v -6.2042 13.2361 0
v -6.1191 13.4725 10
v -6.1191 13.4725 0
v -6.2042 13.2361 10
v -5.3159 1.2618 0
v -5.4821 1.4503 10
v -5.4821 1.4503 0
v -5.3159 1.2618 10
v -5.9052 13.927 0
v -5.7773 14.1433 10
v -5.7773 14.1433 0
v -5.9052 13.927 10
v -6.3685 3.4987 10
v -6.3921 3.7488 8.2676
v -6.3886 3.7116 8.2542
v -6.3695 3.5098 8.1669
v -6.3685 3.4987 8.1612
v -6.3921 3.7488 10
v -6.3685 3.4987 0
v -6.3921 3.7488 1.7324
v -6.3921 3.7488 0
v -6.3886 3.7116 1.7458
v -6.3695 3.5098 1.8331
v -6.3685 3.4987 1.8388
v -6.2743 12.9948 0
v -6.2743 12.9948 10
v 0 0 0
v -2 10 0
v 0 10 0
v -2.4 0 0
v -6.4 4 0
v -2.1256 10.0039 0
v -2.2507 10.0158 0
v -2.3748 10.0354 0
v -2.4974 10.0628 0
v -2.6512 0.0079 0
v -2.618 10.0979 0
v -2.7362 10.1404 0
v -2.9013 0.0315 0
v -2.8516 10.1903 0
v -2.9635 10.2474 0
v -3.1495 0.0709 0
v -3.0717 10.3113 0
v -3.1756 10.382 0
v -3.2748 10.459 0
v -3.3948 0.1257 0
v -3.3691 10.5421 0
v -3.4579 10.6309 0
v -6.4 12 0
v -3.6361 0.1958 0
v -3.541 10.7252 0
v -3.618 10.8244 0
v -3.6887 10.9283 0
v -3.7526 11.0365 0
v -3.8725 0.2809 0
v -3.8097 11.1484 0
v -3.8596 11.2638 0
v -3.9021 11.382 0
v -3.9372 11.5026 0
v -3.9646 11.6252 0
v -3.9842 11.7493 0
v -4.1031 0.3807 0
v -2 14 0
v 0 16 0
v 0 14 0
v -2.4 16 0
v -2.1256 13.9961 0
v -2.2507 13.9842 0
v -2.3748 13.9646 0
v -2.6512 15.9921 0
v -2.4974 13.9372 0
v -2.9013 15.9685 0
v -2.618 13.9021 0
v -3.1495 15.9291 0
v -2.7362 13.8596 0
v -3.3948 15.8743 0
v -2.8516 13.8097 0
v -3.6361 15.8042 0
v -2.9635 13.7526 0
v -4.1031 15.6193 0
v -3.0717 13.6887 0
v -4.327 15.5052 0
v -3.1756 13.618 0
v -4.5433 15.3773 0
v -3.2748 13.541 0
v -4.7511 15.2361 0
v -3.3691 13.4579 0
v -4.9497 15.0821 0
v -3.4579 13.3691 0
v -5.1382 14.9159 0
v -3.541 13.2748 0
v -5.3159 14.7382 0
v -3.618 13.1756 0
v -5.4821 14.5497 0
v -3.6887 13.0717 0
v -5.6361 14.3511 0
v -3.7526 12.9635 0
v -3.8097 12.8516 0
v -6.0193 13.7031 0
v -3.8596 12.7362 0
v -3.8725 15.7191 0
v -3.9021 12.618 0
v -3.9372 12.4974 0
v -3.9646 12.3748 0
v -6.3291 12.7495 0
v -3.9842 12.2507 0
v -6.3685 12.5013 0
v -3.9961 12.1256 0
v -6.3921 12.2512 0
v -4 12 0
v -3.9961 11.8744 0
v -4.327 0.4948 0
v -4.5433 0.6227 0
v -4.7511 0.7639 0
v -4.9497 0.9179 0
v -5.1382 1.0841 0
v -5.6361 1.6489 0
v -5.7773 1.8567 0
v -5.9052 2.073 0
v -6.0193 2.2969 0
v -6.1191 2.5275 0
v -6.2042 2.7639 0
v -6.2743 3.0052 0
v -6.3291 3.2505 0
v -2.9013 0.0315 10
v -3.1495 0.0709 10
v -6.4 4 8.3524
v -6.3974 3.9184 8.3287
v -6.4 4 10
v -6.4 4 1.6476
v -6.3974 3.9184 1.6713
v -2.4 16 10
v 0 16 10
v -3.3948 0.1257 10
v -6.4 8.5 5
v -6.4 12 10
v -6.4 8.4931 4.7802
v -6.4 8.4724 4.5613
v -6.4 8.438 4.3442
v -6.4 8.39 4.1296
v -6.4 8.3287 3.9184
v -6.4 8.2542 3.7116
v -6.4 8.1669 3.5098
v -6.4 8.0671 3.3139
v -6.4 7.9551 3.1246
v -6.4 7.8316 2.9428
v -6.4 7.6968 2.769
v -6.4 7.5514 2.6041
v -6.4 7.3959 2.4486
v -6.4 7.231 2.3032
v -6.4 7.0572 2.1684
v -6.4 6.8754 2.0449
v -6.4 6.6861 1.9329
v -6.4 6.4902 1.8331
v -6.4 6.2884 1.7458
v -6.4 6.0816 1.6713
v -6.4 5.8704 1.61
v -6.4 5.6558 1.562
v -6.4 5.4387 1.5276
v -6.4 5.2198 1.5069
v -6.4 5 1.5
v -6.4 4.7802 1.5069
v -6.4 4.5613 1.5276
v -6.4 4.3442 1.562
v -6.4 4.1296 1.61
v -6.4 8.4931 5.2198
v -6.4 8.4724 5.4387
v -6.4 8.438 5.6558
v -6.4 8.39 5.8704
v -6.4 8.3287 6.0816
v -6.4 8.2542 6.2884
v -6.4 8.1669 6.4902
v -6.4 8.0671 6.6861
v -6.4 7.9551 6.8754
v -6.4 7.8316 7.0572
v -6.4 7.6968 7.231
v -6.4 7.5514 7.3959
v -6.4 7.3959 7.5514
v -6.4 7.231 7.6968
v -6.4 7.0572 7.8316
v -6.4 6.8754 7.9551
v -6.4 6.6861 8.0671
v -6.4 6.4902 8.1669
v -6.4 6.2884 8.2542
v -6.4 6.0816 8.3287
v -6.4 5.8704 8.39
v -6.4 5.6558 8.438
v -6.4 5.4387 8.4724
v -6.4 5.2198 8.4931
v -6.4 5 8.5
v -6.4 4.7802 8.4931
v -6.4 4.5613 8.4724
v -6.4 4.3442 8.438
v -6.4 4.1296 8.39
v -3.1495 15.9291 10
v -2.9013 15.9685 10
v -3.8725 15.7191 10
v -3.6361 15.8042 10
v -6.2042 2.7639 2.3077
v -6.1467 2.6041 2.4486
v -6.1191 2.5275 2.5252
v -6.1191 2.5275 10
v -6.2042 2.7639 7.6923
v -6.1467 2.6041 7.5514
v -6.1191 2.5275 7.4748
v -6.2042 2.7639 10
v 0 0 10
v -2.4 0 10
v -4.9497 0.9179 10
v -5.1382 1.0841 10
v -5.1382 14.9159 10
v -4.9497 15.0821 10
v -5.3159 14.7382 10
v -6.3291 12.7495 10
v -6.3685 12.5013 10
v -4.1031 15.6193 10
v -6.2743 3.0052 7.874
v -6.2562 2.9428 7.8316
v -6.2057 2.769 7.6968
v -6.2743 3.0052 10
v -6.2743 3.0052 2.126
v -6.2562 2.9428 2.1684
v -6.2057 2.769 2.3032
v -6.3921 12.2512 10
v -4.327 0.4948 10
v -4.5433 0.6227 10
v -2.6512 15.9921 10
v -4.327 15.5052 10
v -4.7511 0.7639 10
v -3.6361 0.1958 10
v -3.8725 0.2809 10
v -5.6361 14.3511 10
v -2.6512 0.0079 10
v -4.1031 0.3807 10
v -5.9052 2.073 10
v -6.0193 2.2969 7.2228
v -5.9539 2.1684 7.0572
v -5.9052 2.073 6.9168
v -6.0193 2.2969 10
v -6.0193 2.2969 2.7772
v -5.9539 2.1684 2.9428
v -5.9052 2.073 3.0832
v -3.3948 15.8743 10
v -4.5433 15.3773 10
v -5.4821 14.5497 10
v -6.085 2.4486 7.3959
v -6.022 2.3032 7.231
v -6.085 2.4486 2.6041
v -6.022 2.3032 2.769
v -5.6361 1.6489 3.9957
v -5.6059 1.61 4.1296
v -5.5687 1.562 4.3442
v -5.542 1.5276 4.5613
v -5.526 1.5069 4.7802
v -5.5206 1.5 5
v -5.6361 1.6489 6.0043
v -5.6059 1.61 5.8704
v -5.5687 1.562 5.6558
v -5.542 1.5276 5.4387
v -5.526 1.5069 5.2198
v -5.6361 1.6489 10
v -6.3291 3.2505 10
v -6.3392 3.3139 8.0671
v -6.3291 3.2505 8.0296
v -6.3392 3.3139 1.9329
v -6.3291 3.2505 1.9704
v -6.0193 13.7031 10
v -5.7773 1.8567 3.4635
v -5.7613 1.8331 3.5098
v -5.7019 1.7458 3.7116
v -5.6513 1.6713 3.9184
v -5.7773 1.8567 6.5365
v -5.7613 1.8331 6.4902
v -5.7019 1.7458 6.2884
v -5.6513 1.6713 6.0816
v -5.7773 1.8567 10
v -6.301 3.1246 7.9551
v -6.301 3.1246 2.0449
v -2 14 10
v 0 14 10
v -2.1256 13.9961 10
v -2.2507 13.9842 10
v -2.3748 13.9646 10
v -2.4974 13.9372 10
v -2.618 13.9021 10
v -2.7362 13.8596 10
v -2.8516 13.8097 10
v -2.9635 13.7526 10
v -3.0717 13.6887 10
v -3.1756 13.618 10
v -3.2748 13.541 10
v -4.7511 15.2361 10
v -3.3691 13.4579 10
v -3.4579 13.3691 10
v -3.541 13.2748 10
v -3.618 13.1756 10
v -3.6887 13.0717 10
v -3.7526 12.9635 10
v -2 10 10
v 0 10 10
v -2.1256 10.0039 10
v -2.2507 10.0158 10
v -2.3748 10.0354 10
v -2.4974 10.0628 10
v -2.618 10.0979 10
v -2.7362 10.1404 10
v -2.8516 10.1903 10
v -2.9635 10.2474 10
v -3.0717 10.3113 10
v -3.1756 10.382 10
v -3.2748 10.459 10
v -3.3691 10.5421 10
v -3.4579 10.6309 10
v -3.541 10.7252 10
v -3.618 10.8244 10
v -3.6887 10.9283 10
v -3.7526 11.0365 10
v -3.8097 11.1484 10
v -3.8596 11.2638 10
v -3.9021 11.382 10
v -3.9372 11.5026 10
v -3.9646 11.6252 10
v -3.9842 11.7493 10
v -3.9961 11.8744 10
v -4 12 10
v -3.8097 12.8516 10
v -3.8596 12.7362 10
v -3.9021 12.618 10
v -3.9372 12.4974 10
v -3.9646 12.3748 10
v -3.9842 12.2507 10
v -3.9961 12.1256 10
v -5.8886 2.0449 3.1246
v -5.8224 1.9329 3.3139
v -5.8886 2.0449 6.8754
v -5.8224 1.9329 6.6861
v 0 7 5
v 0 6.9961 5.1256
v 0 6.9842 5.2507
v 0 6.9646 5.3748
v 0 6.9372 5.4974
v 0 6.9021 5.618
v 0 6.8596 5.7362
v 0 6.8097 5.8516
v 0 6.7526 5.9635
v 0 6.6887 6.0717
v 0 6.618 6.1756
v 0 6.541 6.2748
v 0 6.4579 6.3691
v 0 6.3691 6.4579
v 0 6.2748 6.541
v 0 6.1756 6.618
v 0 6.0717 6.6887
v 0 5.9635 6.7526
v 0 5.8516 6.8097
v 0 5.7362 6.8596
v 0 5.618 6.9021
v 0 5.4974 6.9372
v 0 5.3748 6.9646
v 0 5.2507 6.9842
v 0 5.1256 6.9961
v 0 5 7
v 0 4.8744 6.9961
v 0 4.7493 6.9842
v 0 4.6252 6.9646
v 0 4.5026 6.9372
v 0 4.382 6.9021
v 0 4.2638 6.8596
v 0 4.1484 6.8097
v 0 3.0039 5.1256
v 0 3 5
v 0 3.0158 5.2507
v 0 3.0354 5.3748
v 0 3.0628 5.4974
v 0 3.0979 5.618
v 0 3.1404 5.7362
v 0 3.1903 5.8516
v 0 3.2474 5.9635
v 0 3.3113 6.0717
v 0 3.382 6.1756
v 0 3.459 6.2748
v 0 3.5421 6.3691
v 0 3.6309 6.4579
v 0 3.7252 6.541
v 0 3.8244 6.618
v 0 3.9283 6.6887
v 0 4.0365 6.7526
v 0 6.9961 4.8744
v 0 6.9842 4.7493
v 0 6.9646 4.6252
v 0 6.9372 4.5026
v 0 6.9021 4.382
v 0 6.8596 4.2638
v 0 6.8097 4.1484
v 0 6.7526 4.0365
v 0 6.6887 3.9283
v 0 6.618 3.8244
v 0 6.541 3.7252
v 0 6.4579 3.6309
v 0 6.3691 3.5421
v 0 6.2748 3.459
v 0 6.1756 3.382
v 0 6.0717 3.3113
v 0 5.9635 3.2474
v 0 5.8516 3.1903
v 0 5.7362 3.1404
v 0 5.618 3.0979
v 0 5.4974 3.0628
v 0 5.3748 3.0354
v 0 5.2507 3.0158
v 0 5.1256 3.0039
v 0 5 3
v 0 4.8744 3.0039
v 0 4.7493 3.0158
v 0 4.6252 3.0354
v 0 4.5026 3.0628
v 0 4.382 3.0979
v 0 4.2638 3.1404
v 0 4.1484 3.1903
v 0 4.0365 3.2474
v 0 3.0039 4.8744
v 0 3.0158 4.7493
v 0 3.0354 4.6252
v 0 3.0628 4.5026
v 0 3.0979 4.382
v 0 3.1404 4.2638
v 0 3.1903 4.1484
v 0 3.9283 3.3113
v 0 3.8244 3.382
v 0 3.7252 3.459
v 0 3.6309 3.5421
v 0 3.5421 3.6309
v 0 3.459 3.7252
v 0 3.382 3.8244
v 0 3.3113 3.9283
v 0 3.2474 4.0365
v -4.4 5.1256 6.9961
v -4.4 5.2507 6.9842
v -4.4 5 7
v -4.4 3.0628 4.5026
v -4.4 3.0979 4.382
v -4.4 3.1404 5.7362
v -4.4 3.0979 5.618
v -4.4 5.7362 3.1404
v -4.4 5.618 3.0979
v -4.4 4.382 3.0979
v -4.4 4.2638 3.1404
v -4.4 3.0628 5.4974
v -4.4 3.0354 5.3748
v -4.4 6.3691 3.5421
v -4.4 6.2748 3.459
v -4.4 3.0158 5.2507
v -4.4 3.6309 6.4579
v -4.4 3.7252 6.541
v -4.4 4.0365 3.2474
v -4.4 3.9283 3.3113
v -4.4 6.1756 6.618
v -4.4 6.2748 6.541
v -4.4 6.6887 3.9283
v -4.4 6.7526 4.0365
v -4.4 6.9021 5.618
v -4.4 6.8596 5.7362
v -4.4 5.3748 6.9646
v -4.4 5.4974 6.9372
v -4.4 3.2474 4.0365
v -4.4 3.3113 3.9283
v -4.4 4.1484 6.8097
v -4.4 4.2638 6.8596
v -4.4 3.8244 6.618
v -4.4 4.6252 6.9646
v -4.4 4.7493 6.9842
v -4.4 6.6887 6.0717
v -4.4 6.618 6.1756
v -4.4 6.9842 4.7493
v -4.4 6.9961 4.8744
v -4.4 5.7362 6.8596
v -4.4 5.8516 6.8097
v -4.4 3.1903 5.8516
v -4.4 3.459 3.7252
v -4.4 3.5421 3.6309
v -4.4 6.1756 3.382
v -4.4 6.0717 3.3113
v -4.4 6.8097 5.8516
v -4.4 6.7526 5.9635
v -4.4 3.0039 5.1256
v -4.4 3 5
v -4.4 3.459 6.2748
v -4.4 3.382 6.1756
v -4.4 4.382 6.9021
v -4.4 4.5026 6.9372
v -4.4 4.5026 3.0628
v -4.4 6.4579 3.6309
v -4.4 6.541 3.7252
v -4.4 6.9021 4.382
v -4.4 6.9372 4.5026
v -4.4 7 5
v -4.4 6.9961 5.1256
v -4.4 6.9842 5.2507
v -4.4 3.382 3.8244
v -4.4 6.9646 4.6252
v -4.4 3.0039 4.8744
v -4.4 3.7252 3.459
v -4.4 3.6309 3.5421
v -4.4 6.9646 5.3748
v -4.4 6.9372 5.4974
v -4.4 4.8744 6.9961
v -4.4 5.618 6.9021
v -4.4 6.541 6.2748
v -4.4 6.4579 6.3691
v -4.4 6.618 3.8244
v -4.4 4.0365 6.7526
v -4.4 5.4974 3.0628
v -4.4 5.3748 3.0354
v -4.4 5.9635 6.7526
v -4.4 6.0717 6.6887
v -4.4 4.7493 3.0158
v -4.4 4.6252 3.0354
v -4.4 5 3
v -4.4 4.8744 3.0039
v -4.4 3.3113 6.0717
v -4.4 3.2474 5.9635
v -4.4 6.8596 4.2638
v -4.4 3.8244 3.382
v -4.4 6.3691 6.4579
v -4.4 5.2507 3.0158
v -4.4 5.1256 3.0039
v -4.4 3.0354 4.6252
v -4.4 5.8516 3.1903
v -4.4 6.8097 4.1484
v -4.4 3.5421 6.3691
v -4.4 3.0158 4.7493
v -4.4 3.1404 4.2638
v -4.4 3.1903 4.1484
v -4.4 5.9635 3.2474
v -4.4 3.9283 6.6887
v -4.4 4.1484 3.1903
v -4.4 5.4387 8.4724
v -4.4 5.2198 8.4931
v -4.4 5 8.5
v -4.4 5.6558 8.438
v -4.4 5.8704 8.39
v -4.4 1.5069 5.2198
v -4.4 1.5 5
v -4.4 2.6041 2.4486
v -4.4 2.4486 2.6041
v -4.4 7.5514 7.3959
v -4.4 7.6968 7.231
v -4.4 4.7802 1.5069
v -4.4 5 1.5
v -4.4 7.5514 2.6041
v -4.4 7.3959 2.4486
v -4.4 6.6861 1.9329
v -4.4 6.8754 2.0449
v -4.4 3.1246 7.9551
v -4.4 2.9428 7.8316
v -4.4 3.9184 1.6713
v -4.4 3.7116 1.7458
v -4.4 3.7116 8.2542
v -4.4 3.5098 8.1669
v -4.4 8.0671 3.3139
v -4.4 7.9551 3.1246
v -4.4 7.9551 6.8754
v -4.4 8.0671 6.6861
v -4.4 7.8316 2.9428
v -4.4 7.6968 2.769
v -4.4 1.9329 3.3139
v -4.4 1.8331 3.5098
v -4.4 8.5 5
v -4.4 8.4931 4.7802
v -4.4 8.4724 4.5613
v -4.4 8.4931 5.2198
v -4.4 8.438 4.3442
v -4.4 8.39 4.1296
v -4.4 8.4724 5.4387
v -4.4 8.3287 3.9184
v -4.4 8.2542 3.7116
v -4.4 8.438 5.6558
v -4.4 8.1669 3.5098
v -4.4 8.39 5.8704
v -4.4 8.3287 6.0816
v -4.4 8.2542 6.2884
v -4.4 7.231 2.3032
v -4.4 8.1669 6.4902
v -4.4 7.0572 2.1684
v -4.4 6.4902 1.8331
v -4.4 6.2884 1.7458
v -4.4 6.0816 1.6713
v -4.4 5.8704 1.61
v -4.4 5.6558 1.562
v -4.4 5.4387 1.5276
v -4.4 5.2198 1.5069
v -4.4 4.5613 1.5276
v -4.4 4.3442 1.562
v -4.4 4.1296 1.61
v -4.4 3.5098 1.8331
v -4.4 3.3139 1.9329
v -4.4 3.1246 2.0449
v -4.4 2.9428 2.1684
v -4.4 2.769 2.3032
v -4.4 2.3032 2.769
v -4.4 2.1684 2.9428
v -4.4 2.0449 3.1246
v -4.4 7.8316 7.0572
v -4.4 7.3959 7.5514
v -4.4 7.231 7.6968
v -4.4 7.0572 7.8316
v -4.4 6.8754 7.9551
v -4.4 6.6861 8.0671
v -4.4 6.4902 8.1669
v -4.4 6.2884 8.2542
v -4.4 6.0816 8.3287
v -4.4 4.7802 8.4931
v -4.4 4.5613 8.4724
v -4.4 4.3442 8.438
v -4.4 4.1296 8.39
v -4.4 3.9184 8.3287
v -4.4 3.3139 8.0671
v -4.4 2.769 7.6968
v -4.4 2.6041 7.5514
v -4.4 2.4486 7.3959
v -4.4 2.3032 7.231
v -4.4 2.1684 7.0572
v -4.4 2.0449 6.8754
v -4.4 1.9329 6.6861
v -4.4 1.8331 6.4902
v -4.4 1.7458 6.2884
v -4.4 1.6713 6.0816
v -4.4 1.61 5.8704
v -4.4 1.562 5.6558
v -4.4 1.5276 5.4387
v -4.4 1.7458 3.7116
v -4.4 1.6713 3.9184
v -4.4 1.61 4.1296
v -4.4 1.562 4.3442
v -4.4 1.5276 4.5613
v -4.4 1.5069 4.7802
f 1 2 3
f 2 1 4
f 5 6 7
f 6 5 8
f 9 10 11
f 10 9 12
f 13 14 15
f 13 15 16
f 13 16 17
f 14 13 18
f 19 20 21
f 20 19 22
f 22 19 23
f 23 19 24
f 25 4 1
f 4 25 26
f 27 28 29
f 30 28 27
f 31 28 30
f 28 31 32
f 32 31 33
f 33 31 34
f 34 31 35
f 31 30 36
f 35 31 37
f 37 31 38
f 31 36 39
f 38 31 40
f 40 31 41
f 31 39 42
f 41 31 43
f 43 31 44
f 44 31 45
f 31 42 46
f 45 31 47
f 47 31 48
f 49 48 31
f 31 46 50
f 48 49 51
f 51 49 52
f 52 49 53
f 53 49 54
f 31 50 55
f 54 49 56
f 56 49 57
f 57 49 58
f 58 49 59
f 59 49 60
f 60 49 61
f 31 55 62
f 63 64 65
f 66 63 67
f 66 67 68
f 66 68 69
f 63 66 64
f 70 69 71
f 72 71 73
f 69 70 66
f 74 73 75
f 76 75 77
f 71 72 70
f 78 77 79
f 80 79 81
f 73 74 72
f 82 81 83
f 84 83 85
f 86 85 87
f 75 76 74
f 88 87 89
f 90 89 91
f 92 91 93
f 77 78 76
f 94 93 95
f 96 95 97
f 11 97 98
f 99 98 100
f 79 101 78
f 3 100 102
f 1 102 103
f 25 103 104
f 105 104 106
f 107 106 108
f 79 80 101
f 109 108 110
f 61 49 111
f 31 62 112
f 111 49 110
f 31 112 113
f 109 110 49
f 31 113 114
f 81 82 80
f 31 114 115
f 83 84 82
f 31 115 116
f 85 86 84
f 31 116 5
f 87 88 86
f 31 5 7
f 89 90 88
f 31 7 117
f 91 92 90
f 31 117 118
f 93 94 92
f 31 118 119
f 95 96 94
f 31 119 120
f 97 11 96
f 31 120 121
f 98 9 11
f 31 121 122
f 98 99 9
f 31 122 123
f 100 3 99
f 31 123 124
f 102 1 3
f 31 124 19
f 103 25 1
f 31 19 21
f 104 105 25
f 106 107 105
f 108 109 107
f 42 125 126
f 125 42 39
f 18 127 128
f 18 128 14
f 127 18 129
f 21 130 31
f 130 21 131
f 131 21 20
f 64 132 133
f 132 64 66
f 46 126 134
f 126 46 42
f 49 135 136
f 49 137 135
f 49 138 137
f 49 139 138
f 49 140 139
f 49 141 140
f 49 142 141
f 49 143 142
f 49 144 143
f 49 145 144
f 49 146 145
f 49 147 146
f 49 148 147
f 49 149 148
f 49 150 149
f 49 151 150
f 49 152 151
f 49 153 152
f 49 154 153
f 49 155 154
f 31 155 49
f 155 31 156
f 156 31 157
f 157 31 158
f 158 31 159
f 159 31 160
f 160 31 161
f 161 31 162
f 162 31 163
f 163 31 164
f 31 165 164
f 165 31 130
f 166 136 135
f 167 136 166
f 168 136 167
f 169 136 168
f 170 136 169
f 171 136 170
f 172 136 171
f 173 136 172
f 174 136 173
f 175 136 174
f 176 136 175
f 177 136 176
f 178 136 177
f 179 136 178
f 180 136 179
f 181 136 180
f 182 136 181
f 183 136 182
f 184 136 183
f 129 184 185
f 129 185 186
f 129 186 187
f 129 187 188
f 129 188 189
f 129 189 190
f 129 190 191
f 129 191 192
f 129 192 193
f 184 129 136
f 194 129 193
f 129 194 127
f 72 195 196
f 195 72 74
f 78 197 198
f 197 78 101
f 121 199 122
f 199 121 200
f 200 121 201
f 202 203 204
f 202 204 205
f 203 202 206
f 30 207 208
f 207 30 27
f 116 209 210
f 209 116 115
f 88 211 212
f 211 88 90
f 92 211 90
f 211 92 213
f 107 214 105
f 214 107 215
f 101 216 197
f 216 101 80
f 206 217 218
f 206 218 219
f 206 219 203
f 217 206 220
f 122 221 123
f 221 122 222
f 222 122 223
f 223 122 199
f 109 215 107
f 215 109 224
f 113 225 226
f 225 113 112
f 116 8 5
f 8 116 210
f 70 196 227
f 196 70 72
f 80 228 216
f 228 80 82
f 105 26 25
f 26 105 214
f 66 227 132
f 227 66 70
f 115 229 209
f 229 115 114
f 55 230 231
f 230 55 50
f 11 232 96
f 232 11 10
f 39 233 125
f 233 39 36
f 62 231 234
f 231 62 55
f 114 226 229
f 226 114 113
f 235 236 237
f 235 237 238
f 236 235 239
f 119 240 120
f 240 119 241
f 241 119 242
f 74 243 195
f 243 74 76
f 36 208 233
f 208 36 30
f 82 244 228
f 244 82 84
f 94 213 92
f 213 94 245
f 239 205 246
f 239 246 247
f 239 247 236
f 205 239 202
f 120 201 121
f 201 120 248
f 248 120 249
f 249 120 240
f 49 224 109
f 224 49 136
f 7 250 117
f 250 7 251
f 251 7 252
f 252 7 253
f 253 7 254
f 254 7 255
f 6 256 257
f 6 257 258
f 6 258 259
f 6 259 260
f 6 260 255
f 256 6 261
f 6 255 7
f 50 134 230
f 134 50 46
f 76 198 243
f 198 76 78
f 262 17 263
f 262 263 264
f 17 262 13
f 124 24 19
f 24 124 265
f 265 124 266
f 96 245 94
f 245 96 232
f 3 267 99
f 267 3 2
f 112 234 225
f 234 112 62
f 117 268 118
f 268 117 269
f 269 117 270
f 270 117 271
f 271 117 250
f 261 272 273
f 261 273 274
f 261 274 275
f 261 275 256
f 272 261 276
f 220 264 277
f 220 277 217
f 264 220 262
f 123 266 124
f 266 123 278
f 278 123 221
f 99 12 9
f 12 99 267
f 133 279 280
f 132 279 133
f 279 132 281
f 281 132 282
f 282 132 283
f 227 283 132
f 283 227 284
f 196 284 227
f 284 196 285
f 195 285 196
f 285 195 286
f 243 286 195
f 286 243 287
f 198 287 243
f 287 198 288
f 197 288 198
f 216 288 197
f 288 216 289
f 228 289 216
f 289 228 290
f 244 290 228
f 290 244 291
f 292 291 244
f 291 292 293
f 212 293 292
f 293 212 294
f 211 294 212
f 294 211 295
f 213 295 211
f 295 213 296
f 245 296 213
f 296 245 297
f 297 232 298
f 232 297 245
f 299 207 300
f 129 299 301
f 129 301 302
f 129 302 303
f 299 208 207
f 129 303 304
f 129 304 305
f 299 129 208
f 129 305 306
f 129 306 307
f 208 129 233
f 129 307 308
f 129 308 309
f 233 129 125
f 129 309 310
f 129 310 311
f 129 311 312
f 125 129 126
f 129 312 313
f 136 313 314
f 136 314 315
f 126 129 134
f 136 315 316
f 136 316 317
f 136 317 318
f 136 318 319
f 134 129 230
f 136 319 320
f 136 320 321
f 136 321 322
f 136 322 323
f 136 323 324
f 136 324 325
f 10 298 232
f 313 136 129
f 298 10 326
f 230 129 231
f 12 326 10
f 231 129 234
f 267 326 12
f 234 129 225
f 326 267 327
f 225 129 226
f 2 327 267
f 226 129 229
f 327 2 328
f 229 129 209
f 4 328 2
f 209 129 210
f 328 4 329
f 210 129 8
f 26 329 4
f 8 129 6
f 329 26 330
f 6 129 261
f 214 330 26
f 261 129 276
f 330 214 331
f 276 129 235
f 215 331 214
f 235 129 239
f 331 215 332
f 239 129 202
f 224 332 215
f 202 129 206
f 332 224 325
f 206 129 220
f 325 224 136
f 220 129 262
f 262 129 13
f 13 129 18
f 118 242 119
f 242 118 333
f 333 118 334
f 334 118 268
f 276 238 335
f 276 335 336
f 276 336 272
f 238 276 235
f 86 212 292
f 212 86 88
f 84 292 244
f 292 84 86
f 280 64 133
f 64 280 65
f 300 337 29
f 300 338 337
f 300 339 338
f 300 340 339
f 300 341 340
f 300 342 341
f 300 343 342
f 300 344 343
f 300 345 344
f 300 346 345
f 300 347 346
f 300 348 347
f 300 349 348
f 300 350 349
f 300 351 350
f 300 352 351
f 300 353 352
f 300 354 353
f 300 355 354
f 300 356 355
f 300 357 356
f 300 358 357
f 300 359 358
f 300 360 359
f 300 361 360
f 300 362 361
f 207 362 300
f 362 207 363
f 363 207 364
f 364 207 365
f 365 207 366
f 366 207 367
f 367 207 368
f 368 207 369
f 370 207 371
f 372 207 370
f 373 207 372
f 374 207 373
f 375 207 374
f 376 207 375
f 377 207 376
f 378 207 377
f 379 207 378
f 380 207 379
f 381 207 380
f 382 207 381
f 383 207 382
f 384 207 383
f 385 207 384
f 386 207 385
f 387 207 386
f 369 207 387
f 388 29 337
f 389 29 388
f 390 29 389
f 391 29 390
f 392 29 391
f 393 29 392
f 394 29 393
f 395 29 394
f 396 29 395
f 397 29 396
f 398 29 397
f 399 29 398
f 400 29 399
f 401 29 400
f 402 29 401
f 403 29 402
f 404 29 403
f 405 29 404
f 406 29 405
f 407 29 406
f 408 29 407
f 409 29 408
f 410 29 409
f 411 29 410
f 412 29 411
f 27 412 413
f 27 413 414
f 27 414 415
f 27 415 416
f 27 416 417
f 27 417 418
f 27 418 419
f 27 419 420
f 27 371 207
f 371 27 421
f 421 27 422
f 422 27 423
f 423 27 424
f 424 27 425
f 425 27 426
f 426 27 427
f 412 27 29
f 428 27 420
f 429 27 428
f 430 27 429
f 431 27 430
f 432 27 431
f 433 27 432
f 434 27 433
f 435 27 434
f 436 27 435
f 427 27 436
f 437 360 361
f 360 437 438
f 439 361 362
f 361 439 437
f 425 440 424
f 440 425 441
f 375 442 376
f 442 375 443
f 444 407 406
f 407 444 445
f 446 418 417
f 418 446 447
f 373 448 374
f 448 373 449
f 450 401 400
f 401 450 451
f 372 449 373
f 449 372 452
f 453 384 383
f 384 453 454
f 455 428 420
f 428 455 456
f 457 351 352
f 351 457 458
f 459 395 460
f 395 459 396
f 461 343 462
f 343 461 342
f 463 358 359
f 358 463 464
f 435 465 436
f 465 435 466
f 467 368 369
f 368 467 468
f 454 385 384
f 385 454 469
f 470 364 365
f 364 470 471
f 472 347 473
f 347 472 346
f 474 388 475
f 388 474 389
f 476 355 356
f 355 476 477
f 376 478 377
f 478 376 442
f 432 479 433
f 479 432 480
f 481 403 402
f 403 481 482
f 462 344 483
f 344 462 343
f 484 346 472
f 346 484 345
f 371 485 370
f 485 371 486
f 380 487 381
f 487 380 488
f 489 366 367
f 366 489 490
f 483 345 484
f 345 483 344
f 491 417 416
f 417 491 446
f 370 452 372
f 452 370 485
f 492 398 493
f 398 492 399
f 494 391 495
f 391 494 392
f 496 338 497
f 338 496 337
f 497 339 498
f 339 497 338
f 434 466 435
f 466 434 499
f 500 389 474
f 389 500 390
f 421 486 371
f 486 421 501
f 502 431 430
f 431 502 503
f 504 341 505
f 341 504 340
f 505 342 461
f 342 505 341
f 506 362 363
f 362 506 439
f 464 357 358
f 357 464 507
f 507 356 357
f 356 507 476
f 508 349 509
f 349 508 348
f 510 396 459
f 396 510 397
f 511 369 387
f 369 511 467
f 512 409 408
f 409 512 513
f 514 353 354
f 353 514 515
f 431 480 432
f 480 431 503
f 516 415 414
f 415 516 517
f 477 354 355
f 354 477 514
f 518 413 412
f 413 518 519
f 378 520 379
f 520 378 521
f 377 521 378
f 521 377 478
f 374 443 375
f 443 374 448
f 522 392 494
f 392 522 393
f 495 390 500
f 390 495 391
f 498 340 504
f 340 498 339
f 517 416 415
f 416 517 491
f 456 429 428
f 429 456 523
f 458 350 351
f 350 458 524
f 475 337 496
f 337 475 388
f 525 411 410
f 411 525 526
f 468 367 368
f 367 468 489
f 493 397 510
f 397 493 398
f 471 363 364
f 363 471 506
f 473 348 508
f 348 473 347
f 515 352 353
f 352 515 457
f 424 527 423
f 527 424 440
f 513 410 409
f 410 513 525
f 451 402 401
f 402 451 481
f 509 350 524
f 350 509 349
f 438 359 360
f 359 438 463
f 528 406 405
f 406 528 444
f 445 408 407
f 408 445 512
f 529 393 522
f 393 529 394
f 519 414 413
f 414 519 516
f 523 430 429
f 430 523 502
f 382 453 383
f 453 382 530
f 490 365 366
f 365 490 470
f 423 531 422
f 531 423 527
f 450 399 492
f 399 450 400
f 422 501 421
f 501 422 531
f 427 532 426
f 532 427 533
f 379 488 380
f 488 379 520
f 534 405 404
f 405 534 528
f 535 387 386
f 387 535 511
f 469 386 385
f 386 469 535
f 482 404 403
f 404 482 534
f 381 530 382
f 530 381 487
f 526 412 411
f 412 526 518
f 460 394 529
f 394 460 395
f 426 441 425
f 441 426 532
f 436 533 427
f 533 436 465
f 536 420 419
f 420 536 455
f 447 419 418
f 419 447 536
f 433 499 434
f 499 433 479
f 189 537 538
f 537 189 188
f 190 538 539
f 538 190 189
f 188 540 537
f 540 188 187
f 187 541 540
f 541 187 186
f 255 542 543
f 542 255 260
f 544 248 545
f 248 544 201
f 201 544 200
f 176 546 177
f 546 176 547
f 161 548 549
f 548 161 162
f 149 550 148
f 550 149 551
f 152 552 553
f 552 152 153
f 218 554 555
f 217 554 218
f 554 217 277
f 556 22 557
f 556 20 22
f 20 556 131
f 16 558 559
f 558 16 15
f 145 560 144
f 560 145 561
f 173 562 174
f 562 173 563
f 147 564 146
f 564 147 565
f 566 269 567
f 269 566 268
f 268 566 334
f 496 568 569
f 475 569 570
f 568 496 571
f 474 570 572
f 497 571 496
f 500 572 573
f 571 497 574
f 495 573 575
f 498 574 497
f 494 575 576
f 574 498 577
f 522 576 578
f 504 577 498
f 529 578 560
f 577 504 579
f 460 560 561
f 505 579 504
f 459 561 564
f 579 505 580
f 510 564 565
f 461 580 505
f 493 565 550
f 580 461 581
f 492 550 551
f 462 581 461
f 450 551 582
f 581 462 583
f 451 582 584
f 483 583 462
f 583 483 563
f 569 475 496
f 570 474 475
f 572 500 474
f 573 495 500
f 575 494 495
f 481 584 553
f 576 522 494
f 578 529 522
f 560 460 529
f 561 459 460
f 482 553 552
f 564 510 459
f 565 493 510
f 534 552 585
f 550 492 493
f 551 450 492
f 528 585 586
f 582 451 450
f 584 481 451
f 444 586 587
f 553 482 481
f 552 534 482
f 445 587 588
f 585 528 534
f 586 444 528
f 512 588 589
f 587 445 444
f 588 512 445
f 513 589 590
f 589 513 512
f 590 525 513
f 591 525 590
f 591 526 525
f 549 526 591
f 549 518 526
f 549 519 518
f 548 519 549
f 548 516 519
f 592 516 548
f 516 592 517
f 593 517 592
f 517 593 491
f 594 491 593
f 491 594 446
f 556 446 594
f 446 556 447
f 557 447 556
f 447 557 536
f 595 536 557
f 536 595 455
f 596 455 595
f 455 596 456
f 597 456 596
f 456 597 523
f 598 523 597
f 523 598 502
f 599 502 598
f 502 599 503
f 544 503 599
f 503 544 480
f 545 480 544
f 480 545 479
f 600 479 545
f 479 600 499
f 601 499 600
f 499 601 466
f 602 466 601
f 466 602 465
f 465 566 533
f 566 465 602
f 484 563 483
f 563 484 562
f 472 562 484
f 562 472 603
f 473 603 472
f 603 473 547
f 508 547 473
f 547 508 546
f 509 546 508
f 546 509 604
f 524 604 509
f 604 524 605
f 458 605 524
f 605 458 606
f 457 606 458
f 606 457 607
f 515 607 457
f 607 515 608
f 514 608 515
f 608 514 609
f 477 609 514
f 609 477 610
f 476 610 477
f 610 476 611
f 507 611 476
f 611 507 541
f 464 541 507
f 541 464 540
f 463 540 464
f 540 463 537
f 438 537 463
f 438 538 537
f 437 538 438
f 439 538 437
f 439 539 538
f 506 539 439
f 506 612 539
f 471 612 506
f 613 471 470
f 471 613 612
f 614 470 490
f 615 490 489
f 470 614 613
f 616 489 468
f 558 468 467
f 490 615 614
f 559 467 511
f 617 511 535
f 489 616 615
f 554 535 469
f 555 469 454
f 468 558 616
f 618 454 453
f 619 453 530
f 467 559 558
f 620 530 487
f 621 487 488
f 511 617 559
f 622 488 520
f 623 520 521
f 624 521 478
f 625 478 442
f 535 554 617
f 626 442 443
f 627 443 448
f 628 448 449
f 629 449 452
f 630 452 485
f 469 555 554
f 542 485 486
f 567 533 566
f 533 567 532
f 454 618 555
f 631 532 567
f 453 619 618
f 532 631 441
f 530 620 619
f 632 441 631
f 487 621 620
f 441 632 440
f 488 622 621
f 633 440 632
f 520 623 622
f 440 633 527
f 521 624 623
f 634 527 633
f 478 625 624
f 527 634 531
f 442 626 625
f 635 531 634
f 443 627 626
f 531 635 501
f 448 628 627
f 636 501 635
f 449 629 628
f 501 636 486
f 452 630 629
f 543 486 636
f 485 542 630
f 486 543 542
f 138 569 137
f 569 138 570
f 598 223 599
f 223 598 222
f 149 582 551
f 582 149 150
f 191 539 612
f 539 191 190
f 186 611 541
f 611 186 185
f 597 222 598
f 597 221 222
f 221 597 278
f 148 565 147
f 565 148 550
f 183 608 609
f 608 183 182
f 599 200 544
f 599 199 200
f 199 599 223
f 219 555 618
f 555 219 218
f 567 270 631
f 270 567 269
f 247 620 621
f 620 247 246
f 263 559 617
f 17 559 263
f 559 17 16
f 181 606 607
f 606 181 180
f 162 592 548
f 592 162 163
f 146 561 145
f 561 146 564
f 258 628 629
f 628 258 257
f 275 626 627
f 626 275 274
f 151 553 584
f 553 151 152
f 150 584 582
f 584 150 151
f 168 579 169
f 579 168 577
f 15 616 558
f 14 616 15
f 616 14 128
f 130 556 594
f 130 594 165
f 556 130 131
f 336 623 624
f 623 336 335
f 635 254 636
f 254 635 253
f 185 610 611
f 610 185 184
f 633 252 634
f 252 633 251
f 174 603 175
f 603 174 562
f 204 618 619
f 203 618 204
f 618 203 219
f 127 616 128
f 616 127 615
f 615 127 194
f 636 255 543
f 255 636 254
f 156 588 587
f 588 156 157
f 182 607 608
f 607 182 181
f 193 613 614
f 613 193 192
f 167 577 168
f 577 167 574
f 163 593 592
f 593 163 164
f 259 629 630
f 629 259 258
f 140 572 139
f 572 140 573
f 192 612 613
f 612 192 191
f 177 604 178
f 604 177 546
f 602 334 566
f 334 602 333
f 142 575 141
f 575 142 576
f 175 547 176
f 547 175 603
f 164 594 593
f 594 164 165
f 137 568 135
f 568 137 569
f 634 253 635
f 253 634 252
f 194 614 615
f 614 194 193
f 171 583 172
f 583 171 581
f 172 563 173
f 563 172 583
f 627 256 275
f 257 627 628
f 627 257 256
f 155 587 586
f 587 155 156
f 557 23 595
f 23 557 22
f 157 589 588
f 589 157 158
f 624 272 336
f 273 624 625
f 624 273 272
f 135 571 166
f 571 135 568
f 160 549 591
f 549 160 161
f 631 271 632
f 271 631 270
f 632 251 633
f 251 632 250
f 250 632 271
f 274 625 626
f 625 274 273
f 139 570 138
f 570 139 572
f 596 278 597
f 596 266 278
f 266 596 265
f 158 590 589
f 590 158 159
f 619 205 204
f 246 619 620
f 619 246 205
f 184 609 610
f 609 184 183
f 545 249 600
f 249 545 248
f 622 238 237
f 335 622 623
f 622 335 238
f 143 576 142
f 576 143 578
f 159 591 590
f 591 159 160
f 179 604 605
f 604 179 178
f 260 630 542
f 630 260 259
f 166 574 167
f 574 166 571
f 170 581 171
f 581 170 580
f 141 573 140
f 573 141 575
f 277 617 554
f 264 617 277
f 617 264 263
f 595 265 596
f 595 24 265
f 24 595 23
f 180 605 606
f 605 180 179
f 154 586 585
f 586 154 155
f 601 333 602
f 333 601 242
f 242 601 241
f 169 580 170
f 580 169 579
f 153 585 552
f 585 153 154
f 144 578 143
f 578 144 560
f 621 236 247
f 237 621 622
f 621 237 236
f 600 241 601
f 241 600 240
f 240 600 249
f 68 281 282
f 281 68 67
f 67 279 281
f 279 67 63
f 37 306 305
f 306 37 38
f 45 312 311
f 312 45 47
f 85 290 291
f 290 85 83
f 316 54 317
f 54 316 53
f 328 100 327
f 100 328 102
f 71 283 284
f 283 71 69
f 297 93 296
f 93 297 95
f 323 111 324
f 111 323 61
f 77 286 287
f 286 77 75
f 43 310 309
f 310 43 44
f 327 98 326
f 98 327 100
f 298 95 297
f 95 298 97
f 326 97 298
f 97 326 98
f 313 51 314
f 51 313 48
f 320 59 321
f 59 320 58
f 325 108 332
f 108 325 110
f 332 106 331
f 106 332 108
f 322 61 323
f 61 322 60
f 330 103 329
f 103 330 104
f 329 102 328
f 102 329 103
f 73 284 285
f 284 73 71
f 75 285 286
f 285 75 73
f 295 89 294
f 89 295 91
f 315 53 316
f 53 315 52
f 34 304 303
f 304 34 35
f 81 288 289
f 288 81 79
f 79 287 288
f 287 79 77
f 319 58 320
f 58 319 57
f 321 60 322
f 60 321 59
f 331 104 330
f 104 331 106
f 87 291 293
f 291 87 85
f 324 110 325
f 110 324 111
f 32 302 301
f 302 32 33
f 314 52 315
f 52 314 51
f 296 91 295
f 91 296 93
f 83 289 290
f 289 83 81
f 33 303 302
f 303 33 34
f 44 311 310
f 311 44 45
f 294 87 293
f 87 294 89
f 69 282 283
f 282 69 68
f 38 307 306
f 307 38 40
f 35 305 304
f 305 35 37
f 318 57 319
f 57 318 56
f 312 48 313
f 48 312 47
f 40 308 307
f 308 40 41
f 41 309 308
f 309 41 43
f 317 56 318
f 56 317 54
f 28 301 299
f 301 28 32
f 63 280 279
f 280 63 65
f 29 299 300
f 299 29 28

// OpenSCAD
// file: common.scad
// This work is licensed under a Creative Commons Attribution-ShareAlike 4.0 International License (http://creativecommons.org/licenses/by-sa/4.0/)

module xmove(dist) { translate([dist, 0, 0]) children(); }
module ymove(dist) { translate([0, dist, 0]) children(); }
module zmove(dist) { translate([0, 0, dist]) children(); }
module xrot(angle) { rotate([angle, 0, 0]) children(); }
module yrot(angle) { rotate([0, angle, 0]) children(); }
module zrot(angle) { rotate([0, 0, angle]) children(); }

module round_cube(dimensions, radius, center=false) {
    if (center) {
        translate([0, 0, -0.5]) _round_cube(dimensions, radius, center);
    } else {
        translate([radius, radius, 0]) _round_cube(dimensions, radius);
    }
}

module _round_cube(dimensions, radius, center=false) {
        minkowski() {
            cube([dimensions[0] - radius*2, dimensions[1] - radius*2, dimensions[2] - 1], center=center);
            cylinder(r=radius,h=1);
        }
}


module hollow_cylinder_thick(height, outer_radius, thickness) {
    difference() {
        cylinder(h=height, r=outer_radius, center=true);
        cylinder(h=height + 0.02, r=outer_radius - thickness, center=true);
    }
}

module hollow_cylinder(height, externalDiameter, internalDiameter) {
    difference() {
        cylinder(height, r=externalDiameter/2);
        translate([0, 0, -1]) cylinder(height + 2, r=internalDiameter/2);
    }
}

module screw_hole(screwDiameter, headDiameter, depth, headDepth) {    
    translate([0, 0, -depth]) cylinder(h=4 * depth, r=screwDiameter / 2);
    translate([0, 0, depth - headDepth]) cylinder(h=4 * depth, r=headDiameter / 2);
}

module cylinder_sector(diameter, startAngle, endAngle) {
    cylinder(h=height, d=diameter);
}


$fn=100;
size=10;
distance=0;

round_cube(dimensions=[10,10,3], radius=3);
!round_cube(dimensions=[10,10,3], radius=3, center=true);
hollow_cylinder(height=3, externalDiameter=10, internalDiameter=7);
difference() { cube([10, 10, 3]); translate([5, 5, 0]) screw_hole(screwDiameter=3, headDiameter=6, depth=3, headDepth=1); }
cylinder_sector(height=3, diameter=10, startAngle=0, endAngle=180);
// main file
// This work is licensed under a Creative Commons Attribution-ShareAlike 4.0 International License (http://creativecommons.org/licenses/by-sa/4.0/)

use <common.scad>;

$fn=100;
width=10;
height=16;
thickness=6.4;
hole_diameter=4;
screw=(height-2-hole_diameter)/2;

rotate([0, -90, 0]) difference() {


difference() {
    translate([0, 0, -thickness]) rotate([90, 0, 90]) round_cube(dimensions=[height, thickness*2, width], radius=4);
    translate([-1, -1, -thickness-1]) cube([width + 2, height + 2, thickness + 1]);
}

translate([width/2, screw, 0]) screw_hole(screwDiameter=4, headDiameter=7, depth=thickness, headDepth=2);

translate([-1, height-2-hole_diameter/2, hole_diameter/2]) rotate([90, 0, 90]) union() {
        cylinder(d=hole_diameter, h=width + 2);
        translate([-hole_diameter/2, -hole_diameter, 0]) cube([hole_diameter, hole_diameter, width + 2]);
    }
}
